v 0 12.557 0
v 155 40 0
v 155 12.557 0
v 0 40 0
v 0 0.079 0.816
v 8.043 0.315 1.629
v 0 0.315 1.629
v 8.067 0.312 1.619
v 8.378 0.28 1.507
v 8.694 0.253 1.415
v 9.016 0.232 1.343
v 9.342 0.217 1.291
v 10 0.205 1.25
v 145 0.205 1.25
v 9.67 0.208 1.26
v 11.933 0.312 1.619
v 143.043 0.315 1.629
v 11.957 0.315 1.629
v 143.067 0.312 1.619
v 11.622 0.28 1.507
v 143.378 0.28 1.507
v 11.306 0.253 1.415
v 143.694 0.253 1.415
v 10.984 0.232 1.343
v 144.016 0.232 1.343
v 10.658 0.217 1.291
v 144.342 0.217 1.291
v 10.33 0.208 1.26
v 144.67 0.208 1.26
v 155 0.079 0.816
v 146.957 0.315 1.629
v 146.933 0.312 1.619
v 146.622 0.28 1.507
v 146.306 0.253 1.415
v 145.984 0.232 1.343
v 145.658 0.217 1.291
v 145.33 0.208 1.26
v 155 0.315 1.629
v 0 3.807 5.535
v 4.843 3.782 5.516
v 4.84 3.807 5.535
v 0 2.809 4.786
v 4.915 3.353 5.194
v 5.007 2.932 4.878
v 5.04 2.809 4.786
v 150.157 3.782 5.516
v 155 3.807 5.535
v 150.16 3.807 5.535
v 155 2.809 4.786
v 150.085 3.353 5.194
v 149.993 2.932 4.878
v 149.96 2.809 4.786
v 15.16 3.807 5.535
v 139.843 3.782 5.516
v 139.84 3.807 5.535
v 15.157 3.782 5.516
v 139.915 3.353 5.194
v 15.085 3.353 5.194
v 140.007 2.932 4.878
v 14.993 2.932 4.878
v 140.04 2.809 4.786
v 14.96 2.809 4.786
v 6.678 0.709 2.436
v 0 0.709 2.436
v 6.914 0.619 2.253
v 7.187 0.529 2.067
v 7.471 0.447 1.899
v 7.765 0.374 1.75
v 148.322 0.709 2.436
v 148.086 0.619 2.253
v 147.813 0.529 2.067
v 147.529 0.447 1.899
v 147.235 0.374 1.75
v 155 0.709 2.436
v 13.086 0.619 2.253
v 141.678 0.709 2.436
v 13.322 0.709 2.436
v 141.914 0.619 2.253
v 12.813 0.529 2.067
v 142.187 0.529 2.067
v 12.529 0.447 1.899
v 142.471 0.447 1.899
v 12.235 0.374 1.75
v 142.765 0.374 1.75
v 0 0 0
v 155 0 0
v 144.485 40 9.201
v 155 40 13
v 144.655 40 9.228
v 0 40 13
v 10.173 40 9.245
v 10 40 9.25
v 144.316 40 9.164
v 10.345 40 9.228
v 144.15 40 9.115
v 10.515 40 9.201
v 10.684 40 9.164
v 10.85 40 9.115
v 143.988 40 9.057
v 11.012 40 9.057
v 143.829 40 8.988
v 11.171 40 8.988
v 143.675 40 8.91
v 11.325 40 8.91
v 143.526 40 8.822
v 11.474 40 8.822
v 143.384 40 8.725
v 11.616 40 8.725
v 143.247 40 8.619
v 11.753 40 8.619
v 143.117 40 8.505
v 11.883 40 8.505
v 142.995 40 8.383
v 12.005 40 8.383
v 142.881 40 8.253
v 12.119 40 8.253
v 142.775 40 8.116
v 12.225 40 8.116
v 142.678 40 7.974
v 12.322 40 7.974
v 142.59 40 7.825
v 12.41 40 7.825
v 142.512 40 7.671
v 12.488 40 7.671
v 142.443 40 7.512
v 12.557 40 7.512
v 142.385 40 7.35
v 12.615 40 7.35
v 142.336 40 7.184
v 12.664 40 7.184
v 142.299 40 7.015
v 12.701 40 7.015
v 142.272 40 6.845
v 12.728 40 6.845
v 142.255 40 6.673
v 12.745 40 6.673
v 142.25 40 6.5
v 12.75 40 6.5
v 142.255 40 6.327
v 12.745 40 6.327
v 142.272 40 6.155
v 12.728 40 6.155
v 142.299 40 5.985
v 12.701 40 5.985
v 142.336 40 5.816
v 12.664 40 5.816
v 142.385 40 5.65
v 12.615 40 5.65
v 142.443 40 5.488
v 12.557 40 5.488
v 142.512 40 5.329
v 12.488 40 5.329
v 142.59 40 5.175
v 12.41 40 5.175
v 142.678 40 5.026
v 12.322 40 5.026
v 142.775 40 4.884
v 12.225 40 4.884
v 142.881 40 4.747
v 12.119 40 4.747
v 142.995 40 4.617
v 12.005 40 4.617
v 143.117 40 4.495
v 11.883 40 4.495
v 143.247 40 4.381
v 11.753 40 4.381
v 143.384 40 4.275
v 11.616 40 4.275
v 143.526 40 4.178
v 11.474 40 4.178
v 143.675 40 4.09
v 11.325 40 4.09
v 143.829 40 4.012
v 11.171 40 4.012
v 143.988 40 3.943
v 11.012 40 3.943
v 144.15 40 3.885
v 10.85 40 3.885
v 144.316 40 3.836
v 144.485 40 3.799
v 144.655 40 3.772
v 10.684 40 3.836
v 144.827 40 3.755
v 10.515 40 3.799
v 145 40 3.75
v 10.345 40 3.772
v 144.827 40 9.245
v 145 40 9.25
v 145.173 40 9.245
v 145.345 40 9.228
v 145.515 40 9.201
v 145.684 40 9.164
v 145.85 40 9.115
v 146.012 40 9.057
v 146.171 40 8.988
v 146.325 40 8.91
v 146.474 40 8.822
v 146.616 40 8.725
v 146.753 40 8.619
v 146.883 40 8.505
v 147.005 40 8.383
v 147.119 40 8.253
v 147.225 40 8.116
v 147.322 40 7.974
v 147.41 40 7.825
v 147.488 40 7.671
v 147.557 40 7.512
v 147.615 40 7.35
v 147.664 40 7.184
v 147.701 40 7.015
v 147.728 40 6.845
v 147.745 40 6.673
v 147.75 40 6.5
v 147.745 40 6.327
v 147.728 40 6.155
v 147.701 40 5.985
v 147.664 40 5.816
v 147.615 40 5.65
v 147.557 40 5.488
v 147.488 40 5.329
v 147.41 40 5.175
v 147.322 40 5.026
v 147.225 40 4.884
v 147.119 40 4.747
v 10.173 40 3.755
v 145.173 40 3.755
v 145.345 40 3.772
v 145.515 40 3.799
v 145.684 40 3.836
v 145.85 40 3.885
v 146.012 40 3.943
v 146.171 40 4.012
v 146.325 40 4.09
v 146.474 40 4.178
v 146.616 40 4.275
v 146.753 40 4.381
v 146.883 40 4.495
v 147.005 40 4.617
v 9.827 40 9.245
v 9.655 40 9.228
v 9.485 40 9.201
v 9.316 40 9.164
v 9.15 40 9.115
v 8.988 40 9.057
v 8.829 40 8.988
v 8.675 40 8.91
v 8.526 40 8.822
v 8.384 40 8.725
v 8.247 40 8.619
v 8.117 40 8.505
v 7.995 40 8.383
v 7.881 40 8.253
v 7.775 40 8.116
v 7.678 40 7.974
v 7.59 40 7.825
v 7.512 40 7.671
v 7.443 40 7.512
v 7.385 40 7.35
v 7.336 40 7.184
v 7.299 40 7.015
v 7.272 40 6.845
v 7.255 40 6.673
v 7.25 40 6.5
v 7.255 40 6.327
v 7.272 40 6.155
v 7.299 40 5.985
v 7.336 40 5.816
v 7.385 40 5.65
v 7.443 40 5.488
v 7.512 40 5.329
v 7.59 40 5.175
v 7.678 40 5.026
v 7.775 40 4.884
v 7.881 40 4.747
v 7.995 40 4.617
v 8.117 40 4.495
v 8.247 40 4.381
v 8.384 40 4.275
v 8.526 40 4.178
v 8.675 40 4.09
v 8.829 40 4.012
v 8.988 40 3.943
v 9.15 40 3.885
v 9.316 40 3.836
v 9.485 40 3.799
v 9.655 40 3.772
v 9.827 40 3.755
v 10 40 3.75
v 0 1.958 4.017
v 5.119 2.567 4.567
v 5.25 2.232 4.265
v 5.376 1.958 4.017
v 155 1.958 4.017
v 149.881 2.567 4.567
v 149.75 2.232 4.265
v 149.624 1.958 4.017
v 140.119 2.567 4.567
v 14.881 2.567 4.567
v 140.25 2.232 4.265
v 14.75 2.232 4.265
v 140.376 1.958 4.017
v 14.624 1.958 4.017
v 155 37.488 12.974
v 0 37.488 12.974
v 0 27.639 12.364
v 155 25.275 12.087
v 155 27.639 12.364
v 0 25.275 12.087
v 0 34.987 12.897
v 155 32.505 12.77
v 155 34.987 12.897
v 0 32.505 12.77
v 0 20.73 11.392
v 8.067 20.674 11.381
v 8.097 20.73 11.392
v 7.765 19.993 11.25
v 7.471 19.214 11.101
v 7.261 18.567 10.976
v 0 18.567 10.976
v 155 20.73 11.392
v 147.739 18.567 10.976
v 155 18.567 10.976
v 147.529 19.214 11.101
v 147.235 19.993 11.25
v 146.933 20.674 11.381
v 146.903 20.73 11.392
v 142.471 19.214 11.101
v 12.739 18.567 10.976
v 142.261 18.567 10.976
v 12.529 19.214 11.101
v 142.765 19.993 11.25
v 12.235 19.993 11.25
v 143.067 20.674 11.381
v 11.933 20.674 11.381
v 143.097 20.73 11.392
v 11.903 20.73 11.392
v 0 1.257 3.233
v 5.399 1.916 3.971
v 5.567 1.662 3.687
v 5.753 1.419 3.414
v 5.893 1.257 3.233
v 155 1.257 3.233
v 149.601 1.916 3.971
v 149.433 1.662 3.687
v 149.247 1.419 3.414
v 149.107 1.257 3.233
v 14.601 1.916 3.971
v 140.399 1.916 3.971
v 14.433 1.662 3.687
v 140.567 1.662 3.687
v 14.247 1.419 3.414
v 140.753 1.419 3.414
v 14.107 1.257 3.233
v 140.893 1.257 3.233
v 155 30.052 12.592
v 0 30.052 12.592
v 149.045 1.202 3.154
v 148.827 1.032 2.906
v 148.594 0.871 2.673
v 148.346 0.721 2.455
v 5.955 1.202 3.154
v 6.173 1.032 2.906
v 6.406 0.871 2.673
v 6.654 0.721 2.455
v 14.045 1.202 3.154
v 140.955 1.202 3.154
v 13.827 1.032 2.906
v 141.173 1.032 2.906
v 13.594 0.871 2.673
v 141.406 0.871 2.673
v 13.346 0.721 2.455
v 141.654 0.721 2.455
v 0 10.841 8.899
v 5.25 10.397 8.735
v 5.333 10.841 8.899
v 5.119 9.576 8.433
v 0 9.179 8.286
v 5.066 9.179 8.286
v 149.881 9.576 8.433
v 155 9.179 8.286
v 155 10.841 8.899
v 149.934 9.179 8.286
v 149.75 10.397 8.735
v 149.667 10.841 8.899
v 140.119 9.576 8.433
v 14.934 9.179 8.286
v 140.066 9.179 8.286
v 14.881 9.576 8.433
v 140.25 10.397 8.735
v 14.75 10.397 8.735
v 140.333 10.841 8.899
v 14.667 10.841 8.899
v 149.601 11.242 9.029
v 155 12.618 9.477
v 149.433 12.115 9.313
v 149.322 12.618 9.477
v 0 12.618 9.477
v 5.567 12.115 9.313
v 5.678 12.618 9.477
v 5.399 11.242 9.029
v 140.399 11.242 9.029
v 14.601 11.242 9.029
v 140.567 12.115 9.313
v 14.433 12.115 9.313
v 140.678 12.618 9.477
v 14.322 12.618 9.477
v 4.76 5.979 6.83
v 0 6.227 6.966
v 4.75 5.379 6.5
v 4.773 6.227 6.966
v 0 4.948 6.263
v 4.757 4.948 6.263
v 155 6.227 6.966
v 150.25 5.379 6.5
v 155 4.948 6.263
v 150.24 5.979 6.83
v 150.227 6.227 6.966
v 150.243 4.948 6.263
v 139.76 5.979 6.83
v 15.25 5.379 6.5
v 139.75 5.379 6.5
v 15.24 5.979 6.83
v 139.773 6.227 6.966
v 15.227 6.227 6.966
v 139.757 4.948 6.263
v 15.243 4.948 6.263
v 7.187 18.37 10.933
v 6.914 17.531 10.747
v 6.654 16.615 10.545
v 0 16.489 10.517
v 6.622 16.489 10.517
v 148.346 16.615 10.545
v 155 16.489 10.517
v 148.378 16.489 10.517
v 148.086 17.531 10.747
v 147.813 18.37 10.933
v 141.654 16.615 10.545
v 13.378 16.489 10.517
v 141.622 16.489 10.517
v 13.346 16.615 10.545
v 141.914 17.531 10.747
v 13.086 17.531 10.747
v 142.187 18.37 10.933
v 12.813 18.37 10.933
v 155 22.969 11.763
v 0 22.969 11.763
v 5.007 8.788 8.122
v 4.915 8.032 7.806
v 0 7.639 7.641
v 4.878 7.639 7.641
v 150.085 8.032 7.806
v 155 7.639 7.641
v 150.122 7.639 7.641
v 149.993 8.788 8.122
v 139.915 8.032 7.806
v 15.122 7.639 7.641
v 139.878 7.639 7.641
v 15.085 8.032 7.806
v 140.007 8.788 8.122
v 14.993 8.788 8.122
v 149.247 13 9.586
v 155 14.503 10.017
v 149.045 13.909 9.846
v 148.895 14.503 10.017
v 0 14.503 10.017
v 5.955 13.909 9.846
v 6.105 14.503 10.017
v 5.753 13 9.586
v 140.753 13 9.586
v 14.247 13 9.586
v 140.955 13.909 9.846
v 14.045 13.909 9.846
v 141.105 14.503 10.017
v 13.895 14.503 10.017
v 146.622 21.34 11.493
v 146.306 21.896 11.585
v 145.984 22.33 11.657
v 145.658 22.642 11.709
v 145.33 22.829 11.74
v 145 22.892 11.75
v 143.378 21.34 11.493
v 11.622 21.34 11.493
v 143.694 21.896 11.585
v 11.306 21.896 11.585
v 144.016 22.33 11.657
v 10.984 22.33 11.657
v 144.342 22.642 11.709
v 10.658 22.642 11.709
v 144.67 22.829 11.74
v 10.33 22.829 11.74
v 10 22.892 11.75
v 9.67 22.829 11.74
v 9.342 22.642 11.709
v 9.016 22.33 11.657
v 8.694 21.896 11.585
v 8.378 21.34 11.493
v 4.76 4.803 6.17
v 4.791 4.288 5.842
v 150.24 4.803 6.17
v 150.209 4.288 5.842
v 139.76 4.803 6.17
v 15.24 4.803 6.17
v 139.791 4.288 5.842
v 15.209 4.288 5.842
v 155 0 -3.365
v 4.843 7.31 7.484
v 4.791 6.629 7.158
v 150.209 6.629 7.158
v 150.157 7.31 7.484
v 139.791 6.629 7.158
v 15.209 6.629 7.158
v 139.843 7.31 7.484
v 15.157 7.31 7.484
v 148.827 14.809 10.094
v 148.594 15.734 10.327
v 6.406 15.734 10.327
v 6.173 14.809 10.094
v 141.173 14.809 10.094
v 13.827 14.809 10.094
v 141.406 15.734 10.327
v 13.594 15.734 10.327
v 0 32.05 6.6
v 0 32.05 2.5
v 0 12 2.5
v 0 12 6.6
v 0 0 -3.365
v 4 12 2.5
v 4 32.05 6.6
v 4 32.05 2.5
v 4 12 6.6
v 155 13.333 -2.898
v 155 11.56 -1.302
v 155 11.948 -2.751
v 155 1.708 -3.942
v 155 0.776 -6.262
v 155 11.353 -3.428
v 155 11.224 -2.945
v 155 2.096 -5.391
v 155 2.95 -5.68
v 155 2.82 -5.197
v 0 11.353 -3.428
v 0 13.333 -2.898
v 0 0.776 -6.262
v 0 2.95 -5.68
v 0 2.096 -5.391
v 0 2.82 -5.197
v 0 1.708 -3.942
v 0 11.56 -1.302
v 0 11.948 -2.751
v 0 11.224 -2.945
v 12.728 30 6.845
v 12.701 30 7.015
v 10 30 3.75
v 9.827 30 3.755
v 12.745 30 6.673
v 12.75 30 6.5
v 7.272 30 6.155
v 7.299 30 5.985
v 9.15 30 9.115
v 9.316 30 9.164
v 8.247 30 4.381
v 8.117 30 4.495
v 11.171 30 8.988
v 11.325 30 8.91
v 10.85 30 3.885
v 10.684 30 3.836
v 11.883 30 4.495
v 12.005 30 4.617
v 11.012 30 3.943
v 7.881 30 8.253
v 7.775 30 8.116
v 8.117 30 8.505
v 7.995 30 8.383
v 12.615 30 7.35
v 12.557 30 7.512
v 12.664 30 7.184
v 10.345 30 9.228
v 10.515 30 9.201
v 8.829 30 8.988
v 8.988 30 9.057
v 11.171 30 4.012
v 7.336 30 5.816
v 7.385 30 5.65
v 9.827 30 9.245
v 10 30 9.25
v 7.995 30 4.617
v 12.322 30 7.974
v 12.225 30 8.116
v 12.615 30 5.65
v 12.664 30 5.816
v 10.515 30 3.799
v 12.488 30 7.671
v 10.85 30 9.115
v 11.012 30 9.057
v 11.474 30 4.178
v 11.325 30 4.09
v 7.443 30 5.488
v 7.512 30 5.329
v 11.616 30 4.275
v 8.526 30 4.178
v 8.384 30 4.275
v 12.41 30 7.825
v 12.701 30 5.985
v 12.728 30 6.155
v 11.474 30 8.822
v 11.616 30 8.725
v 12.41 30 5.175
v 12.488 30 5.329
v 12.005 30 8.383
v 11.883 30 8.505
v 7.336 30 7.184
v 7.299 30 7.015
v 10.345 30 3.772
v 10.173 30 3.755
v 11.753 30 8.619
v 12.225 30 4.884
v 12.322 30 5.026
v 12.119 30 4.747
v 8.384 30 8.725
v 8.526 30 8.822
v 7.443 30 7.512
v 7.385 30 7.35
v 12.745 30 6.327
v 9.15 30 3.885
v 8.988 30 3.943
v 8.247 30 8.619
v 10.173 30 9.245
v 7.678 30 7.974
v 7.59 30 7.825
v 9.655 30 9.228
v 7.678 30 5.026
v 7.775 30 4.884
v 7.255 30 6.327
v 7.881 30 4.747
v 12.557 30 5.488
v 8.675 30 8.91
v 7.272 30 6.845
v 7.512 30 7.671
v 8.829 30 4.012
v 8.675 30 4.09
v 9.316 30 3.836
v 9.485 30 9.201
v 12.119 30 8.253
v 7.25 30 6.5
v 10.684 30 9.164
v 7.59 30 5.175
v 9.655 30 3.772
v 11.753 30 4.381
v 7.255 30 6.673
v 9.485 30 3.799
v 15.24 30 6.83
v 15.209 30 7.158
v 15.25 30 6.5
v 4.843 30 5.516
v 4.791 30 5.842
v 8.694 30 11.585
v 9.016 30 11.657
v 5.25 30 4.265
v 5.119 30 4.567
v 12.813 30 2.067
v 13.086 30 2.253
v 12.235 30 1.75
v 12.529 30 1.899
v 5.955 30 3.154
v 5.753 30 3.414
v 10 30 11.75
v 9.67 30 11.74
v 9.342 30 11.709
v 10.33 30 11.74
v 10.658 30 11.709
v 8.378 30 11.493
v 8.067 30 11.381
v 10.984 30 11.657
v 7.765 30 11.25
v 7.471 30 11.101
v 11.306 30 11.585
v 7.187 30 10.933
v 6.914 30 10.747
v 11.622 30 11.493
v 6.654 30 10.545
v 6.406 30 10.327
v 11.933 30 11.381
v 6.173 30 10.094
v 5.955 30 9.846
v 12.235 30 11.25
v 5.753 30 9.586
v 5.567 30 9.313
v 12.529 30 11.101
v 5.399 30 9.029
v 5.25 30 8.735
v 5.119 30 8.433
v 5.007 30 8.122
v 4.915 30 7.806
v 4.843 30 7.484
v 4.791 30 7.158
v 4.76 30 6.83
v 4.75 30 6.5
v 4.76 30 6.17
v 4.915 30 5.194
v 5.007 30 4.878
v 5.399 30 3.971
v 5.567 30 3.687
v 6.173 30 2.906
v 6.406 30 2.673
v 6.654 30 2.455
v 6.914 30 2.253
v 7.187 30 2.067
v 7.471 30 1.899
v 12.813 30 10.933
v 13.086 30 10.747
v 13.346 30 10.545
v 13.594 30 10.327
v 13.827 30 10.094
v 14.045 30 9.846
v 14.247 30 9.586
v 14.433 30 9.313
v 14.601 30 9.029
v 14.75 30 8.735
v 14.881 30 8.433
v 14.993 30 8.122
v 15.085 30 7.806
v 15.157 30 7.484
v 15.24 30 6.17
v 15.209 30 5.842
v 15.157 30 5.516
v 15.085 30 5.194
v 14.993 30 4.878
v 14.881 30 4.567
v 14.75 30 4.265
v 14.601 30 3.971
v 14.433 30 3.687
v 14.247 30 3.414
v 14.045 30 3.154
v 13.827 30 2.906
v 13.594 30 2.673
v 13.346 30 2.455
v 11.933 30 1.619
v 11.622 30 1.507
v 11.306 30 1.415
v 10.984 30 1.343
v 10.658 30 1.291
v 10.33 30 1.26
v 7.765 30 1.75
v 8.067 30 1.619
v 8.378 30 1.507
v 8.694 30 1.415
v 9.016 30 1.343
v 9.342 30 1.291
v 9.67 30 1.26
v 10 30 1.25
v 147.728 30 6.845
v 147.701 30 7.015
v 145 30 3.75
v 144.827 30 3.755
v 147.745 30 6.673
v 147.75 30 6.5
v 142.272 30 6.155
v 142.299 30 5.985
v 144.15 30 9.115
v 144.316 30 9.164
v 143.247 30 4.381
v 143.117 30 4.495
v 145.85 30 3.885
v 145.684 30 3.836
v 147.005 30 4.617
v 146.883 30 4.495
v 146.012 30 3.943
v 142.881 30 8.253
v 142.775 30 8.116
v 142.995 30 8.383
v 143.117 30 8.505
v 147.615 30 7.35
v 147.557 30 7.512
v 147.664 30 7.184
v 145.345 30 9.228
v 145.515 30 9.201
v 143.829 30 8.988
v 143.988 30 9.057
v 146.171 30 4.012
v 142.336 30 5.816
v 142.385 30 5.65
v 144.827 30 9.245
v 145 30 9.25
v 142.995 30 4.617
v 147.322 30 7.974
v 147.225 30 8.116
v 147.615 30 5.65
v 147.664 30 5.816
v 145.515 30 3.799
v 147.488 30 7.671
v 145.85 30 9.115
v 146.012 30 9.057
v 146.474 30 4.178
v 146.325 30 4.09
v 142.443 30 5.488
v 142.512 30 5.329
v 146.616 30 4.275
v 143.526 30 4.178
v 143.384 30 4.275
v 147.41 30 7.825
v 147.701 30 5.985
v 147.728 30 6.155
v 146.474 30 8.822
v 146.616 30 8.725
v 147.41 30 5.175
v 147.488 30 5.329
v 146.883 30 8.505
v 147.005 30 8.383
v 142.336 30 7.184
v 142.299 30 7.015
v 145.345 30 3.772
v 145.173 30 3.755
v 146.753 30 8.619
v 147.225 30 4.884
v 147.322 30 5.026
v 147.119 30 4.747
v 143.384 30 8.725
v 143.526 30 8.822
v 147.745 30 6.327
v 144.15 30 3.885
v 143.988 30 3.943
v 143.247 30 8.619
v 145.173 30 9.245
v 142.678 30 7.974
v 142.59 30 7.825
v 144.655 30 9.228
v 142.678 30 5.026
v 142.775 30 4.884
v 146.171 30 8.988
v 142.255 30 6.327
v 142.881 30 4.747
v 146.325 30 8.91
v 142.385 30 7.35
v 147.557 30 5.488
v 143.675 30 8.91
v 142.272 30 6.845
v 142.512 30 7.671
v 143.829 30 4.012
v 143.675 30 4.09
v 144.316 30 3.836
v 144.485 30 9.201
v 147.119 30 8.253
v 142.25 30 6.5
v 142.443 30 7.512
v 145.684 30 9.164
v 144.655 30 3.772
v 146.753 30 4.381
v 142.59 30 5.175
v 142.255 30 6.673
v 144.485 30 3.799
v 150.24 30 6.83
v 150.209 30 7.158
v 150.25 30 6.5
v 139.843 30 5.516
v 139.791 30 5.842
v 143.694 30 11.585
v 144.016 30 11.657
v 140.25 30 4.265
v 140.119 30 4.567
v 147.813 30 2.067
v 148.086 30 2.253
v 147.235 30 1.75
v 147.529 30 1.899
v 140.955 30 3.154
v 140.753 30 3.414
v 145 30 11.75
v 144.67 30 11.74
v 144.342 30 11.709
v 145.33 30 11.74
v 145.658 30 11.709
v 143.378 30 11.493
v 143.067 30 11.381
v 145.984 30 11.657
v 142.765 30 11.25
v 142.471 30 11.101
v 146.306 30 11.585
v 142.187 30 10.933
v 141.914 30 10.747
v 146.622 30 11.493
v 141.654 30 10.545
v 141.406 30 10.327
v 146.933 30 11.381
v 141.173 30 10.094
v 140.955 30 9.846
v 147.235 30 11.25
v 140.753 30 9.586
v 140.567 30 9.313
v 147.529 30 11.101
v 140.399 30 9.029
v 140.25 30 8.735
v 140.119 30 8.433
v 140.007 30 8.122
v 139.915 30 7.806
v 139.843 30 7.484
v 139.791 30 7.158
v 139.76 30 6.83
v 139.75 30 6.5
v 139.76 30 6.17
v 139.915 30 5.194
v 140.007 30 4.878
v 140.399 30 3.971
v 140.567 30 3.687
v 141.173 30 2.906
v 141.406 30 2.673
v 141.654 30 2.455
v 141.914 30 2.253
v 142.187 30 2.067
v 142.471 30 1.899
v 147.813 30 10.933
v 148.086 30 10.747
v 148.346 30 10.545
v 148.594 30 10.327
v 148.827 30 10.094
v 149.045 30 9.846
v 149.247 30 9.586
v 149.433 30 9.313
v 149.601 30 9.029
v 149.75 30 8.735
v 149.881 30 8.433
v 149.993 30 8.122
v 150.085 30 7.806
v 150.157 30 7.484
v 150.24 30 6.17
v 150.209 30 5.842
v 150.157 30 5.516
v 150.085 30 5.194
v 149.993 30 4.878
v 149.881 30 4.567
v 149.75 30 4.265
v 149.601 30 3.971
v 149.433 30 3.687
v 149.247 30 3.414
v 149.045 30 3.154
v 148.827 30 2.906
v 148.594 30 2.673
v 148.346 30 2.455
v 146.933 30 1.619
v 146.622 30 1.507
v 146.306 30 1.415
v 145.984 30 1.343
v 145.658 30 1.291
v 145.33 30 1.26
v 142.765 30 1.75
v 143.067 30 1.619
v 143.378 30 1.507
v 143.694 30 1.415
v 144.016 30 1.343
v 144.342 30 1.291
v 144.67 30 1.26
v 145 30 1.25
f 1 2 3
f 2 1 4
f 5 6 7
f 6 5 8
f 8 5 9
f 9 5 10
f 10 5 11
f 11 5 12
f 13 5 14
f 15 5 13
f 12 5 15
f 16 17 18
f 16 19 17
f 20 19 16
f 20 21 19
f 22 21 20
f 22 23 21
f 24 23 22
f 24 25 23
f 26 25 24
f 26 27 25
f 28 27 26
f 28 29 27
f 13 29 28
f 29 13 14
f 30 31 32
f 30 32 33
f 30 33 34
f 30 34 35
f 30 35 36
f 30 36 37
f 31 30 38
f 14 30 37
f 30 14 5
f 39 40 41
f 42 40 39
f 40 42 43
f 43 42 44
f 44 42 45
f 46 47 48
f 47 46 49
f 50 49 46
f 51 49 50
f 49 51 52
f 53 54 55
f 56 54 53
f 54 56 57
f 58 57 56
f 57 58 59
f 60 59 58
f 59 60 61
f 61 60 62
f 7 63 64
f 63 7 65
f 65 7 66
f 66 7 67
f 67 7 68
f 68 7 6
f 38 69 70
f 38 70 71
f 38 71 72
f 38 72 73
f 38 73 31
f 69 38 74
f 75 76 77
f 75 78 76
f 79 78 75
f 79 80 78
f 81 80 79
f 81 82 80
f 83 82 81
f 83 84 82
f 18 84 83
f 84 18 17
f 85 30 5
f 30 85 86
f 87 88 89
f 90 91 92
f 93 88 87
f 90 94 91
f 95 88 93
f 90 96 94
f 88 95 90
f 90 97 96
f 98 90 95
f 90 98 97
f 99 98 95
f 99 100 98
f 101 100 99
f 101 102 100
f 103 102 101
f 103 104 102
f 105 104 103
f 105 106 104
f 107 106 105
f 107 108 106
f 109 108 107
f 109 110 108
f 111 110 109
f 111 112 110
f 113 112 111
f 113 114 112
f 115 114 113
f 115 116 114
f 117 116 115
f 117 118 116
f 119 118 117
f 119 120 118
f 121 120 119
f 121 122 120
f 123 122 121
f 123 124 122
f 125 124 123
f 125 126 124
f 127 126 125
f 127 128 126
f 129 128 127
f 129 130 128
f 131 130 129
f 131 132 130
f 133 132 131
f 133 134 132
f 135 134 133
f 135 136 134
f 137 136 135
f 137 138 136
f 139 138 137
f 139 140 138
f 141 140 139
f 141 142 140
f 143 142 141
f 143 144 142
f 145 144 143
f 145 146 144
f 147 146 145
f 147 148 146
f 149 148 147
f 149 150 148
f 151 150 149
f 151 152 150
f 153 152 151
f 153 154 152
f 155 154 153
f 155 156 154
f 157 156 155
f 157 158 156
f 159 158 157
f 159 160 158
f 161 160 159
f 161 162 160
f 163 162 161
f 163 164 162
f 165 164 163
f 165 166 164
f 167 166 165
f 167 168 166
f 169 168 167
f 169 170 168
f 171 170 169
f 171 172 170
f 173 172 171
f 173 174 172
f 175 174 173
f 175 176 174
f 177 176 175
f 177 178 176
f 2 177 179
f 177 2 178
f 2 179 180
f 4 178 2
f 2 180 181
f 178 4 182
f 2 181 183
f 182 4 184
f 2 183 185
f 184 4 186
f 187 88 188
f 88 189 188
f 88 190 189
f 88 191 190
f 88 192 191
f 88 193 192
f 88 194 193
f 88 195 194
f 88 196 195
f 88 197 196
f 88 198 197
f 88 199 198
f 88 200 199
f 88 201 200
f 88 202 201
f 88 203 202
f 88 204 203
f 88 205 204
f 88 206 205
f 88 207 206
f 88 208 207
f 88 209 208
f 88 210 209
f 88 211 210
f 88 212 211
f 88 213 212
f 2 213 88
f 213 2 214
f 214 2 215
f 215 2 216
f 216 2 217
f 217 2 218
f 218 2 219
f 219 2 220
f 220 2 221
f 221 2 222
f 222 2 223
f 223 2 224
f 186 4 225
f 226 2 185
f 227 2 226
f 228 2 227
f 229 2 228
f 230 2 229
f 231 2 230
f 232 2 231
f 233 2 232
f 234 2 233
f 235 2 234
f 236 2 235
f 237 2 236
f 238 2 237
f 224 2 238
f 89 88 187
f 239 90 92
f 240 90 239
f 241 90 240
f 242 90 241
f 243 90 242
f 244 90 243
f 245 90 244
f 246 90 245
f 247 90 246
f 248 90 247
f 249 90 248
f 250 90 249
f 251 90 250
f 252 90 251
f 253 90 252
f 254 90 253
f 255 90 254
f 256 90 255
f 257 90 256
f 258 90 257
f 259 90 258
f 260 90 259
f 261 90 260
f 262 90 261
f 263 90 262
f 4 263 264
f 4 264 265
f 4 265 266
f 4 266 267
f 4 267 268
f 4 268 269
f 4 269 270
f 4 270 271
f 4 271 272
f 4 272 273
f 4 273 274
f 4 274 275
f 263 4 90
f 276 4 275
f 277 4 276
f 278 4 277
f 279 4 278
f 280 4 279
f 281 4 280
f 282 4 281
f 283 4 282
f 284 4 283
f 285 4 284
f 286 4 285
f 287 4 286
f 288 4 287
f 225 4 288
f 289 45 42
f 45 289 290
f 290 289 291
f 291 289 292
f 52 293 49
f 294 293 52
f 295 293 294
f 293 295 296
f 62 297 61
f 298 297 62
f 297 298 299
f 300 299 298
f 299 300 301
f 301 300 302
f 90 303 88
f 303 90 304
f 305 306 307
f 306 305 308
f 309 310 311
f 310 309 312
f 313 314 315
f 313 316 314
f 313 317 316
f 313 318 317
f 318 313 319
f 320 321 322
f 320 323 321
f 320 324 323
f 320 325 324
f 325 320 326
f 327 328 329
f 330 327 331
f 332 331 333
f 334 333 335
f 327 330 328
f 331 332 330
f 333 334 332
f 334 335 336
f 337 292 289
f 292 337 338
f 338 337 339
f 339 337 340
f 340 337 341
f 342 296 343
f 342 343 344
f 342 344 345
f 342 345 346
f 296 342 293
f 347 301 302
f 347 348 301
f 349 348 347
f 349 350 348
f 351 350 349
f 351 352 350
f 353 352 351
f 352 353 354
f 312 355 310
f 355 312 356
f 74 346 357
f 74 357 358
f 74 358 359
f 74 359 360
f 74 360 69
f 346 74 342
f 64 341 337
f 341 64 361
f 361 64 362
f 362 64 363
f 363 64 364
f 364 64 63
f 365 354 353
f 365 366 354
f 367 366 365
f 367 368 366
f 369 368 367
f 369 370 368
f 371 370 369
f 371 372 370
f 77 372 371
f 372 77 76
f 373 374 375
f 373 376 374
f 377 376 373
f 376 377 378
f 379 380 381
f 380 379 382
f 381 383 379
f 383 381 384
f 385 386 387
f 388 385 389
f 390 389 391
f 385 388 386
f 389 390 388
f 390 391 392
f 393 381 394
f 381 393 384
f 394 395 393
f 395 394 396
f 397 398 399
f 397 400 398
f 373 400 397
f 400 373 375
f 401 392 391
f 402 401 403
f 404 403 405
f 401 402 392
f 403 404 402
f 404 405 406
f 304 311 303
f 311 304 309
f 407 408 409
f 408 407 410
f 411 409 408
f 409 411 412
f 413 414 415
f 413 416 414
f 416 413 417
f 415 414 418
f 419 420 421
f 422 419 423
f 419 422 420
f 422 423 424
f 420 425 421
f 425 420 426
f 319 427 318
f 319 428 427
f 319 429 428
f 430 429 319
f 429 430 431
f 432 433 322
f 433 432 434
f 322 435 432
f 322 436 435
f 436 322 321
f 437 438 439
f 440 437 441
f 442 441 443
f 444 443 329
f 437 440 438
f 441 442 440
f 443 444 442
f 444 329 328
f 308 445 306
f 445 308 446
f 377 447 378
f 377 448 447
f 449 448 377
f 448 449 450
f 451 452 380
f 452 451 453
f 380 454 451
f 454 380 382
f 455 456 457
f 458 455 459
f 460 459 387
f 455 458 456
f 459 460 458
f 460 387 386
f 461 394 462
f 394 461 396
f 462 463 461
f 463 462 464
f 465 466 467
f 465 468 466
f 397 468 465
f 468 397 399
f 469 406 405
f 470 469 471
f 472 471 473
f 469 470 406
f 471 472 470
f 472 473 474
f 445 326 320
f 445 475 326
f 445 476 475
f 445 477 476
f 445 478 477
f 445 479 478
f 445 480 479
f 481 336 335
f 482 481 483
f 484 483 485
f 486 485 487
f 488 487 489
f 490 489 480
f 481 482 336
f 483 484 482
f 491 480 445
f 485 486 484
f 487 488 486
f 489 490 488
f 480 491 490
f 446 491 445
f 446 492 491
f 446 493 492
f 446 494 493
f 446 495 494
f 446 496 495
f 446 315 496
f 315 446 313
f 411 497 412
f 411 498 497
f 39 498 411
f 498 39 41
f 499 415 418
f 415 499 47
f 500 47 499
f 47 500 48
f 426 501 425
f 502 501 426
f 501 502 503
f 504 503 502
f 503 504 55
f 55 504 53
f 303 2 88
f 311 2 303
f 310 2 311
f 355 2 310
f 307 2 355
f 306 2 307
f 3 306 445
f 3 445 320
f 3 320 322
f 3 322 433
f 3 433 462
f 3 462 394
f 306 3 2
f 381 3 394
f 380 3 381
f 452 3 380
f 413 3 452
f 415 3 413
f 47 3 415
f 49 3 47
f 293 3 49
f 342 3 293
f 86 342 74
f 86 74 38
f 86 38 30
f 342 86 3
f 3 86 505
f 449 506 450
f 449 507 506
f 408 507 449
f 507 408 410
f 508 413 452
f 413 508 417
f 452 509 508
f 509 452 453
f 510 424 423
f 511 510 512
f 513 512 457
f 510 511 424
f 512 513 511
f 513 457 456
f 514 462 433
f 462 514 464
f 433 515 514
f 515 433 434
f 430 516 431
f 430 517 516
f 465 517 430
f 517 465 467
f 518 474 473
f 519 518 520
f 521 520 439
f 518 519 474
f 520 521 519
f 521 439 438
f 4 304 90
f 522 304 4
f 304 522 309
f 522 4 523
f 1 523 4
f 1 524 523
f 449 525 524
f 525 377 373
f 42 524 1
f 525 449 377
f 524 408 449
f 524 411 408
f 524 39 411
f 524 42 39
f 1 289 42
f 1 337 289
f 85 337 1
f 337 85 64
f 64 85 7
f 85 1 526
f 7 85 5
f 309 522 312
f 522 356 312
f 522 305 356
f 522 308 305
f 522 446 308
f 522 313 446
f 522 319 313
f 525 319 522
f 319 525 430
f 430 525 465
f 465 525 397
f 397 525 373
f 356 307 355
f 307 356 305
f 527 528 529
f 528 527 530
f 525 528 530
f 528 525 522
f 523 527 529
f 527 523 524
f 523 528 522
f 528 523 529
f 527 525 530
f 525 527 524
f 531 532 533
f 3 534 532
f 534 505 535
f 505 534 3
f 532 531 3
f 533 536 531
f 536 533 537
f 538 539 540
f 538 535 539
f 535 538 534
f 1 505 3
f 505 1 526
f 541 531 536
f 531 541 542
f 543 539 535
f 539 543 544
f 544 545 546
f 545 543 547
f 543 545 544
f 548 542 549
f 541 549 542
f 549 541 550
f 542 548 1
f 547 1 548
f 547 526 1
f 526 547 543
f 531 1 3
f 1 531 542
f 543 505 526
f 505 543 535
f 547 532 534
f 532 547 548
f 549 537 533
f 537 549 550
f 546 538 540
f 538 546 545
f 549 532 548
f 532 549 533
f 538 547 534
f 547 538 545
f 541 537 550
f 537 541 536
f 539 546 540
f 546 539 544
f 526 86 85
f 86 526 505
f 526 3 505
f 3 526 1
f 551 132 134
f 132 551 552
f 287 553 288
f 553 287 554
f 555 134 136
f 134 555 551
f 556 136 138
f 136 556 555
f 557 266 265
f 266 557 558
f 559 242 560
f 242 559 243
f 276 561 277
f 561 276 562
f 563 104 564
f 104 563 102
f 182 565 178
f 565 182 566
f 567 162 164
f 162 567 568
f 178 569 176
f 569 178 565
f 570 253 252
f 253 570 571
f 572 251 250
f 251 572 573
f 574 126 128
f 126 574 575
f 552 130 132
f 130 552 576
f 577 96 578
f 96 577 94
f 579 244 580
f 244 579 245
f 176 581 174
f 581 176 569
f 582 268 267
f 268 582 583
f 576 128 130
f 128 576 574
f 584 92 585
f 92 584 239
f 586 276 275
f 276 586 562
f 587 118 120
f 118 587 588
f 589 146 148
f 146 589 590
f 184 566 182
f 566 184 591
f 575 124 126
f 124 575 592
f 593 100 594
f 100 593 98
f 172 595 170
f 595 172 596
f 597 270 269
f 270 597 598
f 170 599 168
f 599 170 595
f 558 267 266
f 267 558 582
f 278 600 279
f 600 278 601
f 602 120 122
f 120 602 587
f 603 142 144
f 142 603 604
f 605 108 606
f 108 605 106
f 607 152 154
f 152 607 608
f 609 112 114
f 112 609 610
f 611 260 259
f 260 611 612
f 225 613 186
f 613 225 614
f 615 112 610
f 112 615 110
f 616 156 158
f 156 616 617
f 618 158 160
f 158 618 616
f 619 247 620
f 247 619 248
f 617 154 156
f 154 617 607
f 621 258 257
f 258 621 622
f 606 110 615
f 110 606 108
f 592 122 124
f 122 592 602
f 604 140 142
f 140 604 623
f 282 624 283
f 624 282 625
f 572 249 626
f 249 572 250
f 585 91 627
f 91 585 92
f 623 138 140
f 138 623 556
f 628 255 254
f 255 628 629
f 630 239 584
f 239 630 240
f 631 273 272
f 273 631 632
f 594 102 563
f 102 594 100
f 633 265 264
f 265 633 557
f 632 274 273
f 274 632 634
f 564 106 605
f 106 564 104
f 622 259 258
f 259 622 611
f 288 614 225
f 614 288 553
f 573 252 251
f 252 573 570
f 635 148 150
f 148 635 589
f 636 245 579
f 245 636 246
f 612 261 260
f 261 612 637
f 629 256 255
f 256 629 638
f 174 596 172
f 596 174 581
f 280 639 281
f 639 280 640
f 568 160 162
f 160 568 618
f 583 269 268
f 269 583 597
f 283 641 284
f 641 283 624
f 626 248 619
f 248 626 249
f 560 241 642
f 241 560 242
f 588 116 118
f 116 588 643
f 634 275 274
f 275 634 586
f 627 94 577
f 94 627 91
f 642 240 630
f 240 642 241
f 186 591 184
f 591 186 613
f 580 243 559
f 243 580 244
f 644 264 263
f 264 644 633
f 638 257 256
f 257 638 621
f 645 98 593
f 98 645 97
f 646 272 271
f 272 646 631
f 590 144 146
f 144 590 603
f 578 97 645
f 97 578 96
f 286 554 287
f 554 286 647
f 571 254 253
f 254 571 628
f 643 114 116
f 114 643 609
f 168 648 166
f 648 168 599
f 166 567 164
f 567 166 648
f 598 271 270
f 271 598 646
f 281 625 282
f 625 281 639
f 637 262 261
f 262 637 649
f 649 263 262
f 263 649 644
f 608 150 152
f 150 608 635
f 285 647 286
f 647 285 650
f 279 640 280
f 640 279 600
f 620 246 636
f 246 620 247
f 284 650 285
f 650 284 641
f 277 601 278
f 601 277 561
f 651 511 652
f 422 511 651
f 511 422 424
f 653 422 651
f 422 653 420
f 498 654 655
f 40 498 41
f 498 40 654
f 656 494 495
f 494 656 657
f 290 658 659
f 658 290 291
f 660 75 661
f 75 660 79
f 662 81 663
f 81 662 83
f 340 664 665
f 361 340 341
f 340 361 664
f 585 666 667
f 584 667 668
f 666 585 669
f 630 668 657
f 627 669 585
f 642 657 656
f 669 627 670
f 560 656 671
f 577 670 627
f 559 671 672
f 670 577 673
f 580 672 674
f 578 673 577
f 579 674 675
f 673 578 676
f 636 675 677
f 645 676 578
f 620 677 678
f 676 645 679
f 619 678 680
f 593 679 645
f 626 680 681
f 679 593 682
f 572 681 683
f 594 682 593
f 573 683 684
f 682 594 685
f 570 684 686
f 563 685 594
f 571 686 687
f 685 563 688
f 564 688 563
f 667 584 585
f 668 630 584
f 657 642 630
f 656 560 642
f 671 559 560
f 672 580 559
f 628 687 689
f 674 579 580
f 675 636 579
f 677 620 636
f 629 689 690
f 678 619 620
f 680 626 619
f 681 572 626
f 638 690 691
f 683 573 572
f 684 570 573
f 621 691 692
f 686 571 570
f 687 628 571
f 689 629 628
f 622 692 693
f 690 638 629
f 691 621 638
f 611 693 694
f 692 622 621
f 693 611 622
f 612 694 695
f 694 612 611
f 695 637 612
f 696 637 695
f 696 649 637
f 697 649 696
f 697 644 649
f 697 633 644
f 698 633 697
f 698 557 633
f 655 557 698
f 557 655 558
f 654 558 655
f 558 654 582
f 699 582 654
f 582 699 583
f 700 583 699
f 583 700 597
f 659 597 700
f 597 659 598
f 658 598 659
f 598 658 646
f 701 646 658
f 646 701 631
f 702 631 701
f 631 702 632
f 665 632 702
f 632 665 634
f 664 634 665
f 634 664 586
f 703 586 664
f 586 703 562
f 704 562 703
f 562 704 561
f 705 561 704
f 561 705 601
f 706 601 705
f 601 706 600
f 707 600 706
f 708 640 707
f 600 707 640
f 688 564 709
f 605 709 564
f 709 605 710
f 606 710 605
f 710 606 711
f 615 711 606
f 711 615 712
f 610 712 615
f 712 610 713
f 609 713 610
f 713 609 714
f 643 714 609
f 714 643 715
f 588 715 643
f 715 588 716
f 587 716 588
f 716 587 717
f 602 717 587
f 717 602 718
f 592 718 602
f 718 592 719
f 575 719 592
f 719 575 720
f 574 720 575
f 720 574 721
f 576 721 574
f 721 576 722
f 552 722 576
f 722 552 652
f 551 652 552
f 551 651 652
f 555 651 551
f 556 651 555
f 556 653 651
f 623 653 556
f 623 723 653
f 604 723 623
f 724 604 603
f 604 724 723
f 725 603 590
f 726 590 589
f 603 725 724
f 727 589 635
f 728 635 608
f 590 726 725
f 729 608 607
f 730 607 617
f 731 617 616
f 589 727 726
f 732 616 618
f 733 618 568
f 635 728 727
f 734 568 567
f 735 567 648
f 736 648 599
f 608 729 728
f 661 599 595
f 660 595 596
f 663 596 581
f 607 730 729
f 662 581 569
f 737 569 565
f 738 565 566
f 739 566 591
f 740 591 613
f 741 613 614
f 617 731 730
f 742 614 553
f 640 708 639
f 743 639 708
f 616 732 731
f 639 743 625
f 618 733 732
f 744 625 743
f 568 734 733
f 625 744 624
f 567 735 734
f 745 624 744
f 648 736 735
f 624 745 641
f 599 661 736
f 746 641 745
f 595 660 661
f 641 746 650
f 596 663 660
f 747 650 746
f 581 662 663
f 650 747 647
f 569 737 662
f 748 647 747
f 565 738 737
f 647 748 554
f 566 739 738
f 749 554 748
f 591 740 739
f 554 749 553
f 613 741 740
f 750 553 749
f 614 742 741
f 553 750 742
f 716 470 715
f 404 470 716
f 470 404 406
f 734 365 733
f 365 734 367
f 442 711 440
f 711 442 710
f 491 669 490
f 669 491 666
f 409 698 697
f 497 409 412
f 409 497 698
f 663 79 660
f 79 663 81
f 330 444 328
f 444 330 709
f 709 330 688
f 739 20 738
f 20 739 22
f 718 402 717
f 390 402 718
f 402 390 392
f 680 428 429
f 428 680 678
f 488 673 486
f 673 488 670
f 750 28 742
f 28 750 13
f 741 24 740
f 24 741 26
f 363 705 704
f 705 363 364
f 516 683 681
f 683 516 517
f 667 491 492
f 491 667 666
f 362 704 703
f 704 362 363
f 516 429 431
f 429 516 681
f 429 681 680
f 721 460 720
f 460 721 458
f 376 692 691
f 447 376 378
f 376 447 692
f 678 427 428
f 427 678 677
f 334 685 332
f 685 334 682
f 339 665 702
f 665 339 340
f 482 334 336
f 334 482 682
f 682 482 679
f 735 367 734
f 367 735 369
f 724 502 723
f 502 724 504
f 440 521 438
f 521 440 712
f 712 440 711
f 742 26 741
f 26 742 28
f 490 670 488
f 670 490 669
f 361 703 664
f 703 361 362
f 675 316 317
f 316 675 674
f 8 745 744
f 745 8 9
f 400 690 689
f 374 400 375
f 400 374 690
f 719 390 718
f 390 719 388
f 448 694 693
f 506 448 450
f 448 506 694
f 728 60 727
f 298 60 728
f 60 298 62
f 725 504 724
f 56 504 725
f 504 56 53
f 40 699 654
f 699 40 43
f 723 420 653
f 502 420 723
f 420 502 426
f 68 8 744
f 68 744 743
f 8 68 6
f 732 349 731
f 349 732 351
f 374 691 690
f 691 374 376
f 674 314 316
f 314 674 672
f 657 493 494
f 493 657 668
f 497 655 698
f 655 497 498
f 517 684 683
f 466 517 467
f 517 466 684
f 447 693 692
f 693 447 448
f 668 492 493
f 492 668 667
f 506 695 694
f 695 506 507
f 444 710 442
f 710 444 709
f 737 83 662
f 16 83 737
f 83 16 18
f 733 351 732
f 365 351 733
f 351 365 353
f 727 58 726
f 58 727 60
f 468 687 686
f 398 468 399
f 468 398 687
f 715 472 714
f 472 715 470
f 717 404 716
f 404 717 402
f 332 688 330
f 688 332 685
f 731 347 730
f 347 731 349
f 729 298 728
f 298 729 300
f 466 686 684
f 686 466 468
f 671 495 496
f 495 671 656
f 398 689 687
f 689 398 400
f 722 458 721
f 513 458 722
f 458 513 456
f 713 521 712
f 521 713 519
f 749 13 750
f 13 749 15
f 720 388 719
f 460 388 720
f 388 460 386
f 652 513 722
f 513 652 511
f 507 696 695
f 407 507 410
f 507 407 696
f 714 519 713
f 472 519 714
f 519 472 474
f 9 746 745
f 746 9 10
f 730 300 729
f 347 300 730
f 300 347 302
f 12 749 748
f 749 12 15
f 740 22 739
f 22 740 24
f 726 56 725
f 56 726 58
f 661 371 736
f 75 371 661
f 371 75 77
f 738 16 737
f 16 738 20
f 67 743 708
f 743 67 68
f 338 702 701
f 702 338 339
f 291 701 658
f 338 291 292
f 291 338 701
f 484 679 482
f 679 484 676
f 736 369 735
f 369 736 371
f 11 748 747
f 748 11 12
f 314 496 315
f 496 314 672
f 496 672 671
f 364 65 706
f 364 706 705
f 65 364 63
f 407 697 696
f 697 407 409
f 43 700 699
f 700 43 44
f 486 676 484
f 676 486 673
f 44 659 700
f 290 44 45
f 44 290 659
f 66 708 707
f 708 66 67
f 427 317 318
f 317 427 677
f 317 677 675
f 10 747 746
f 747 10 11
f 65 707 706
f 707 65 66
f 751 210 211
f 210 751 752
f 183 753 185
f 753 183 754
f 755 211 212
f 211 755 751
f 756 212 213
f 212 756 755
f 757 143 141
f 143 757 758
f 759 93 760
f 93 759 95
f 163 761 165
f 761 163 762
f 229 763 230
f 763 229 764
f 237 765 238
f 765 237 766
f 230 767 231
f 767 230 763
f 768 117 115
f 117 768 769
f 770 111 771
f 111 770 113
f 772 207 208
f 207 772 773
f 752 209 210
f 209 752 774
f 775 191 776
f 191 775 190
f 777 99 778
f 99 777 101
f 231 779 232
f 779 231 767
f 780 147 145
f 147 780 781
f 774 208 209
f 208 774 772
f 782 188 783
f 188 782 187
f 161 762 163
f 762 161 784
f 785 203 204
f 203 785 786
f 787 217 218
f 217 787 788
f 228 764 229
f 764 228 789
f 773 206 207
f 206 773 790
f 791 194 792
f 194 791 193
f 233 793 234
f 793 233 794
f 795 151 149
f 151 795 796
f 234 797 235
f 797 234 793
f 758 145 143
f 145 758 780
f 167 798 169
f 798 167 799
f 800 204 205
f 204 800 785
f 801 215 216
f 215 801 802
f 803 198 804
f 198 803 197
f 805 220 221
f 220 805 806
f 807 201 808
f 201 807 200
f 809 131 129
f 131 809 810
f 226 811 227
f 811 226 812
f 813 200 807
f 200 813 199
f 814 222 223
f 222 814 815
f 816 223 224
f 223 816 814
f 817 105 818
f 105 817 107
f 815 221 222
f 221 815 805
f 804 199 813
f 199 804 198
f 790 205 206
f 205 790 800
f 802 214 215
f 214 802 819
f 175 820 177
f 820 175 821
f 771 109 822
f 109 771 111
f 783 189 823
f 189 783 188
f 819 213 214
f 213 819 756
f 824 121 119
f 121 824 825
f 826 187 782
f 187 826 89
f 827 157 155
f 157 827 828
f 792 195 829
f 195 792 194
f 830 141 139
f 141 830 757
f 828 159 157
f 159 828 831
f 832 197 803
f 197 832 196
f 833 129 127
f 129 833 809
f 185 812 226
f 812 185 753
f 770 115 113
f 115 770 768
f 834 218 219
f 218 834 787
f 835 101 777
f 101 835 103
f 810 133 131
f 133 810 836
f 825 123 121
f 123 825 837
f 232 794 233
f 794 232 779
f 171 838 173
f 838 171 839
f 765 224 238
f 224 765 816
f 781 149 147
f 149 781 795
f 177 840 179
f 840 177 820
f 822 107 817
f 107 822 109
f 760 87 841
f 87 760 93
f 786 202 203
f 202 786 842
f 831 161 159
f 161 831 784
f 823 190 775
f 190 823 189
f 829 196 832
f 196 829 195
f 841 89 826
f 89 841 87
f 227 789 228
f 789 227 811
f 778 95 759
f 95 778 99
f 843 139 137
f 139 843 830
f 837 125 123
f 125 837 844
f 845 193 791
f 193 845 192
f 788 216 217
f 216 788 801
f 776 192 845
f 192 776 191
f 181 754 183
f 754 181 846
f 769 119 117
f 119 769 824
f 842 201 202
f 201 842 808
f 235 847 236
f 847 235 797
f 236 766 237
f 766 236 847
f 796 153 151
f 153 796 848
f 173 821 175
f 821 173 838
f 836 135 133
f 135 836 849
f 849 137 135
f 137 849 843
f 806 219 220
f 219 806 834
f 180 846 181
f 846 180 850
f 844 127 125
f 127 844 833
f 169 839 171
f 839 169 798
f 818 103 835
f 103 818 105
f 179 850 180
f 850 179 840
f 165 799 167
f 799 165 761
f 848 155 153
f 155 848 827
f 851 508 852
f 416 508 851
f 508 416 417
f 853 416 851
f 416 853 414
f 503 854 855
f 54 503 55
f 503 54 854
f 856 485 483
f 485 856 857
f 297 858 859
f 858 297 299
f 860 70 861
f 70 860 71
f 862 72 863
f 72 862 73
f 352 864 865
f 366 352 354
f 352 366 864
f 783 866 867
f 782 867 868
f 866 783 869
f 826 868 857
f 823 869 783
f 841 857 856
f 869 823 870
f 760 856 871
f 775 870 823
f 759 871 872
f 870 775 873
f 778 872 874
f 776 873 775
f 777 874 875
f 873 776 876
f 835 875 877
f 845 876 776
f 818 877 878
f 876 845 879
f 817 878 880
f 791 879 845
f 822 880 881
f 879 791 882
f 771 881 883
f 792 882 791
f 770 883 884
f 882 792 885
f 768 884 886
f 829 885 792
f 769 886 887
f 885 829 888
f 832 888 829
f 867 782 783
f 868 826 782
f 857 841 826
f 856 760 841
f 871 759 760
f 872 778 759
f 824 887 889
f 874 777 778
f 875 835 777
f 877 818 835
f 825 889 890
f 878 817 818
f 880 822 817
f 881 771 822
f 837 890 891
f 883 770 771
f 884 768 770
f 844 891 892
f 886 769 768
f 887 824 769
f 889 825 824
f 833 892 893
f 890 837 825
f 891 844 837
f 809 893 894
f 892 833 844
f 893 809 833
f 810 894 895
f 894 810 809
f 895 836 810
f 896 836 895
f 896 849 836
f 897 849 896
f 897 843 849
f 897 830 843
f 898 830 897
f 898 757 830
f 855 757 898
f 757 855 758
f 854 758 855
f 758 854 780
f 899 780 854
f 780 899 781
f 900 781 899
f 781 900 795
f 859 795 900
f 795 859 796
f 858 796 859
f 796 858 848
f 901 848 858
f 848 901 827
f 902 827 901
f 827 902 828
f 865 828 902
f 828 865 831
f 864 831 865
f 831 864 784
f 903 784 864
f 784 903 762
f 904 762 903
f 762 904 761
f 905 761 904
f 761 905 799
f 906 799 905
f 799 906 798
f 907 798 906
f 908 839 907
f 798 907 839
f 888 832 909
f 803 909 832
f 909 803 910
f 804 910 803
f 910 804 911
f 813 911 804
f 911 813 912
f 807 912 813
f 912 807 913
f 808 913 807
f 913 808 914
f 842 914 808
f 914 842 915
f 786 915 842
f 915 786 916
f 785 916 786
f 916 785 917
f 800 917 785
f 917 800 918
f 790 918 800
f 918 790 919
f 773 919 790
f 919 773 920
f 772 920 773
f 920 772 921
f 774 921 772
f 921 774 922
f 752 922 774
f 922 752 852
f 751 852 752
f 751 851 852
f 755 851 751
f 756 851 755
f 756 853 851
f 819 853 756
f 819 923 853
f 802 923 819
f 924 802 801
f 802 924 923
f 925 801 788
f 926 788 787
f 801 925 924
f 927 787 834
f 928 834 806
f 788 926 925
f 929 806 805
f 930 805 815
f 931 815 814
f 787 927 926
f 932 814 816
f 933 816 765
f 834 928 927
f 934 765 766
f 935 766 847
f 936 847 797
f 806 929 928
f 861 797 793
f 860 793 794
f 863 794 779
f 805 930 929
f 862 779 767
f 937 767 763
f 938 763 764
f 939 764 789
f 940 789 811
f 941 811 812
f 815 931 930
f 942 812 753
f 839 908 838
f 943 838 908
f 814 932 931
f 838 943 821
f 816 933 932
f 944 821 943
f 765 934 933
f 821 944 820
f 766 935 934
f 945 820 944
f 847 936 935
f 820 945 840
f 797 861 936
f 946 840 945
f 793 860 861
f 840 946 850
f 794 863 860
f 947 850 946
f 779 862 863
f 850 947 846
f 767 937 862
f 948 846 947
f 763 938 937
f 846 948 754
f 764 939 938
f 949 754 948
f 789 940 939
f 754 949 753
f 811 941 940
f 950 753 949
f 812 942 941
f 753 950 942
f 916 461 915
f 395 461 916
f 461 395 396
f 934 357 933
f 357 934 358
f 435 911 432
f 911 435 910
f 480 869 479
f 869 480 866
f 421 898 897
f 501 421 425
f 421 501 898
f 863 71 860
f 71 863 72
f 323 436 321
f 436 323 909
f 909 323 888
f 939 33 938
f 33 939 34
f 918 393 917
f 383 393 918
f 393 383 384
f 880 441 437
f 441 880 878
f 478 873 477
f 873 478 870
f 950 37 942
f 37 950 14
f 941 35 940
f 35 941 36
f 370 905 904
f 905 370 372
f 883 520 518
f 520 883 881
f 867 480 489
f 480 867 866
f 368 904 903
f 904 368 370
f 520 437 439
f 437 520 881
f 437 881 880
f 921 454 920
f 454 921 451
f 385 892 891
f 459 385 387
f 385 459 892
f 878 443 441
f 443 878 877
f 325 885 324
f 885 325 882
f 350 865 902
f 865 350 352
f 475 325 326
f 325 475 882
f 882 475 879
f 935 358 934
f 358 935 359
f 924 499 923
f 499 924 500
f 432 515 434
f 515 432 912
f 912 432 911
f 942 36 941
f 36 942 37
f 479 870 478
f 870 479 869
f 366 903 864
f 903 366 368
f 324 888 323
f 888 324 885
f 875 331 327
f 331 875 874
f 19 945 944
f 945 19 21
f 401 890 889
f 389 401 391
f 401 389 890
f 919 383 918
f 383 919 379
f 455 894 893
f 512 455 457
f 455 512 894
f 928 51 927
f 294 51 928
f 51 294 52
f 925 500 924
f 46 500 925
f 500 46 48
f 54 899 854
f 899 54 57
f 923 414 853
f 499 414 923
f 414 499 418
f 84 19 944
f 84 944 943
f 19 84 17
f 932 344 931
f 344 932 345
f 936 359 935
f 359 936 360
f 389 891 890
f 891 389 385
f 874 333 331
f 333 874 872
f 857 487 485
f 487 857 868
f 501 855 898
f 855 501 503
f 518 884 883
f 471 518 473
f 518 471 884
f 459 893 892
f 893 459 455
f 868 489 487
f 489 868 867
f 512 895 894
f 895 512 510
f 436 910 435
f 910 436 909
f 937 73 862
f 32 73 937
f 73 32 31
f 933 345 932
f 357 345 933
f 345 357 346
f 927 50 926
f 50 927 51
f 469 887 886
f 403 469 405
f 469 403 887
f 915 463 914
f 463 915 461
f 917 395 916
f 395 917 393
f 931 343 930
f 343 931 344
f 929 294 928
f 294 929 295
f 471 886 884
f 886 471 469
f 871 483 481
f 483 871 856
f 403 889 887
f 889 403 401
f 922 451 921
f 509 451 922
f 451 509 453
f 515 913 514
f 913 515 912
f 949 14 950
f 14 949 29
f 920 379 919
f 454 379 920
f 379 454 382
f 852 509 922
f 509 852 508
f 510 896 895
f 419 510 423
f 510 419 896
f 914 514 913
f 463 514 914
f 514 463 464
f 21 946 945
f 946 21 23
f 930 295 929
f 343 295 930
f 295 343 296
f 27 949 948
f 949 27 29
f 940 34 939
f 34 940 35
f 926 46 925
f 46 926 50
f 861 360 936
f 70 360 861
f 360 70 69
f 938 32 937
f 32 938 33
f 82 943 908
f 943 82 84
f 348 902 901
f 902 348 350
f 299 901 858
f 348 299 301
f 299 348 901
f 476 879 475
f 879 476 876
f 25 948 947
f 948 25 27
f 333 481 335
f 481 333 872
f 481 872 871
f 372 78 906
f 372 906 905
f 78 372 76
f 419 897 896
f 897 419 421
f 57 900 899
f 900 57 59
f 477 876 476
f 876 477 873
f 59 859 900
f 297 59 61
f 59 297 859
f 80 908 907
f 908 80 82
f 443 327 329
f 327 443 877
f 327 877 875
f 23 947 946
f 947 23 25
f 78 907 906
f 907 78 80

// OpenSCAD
// bracket that supports LED light strip

// true if you are making two part brackets, false otherwise
twopart = true;

// length of a single part bracket, or half of a two part bracket
length = 155;

// material where fasteners attach to the car
bracketheight = 13;

// length of base from car to LED support
baselength = 40;
// thickness of base attached to 
basethickness = 10;

// triangle that supports LED light strip
// hypotenuse of triangle
lightfacewidth = 13;   
  
// angle of LED support relative to base of bracket
lightangle = 15;

// channel for LED light strip
channelheight = 3;

// diameter of the cap head of your M5 fastener of choice (measure and add 1.5 - 2mm)
capheaddiameter = 10.5;

// rotate the design for 3D printing
setupforprinting = false;

// plug or socket for connecting pieces
plug = false;

// template for drilling holes for rivnuts
template = false;

// hole placement in mm from edge
holeplacement = 10;

// two fastener holes instead of 4 on two part brackets- currently unimplemented
twoholes = false;

// "hollow" bracket for less material - currently unimplemented
usehollowbracket = false;

module squarebracket(st, sh, bt, bh) {
    cube([length, bt, bh]);
    translate([0, bt - st, bh]) {
        cube([length, st, sh]);
    }
}

module curvedbracket() {
    translate([0, baselength, 0]){ 
        rotate([-90, 0, -90]){
            linear_extrude(height = length)
            difference() {
                resize([baselength * 2, bracketheight * 2])circle($fn=100); 
                translate([-baselength, 0, 0]) { 
                    square(baselength * 2);
                }
                translate([-40, -bracketheight, 0]) {
                    square(40);
                }
            }
        }
    }
}

module lightbase(l) {
    lightheight = (sin(lightangle) * lightfacewidth);
    lightwidth =  (cos(lightangle) * lightfacewidth);
    translate([0, lightwidth, 0]) {
        rotate([180, 0, 0]) {
        polyhedron(//pt 0        1        2        3        4        5
                    points=[[0,0,0], [l,0,0], [l,lightwidth,0], [0,lightwidth,0], [0,lightwidth,lightheight], [l,lightwidth,lightheight]],
                    faces=[[0,1,2,3],[5,4,3,2],[0,4,5,1],[0,3,4],[5,2,1]]
                    );
        }
    }
    ledtrack(lightheight);
}

module ledtrack(h) {
    // lots of math to put the track where it goes...
    yoffset = sin(lightangle) * channelheight;
    zoffset = cos(lightangle) * channelheight;

    translate([0, yoffset, -h - zoffset]) {
        rotate([lightangle, 0, 0]) {
            difference() {
                cube([length, lightfacewidth, channelheight]);
                translate([0, 1.5, 0.5]) {
                    cube([length, 10.2, 1.5]);
                }
                translate([0, 2.25, 0]) {
                    cube([length, 8.7, 1.5]);
                }


                translate([length, 0, 0]) {
                    cube([0, 13, 1.5]);
                }

            }
        }
    }
}

module mountingholes(inset) {
    holelength = length;
    // if (plug == true) {
    //     holelength = length;
    // }
    rotate([90, 0, 0]) {
        translate([inset, bracketheight / 2, -baselength]) {
            cylinder(h=baselength, r = 5.5 / 2, $fn=100); 
        }
        translate([inset, bracketheight / 2, -baselength + 10]) {
            cylinder(h=baselength, r = capheaddiameter / 2, $fn=100); 
        }
        translate([holelength - inset, bracketheight / 2, -baselength]) {
            cylinder(h=baselength, r = 5.5 / 2, $fn=100); 
        }
        translate([holelength - inset, bracketheight / 2, -baselength + 10]) {
            cylinder(h=baselength, r = capheaddiameter / 2, $fn=100); 
        }
    }
}

module plug() {
    test = plug ? 0 : length;
    baselengthcenter = baselength / 2;
    baselengthheight = basethickness / 2;

    translate([length, baselengthcenter / 2 + 2, baselengthheight / 2]) {
        cube([4, baselength/2, 4]);
    }
}

module socket() {
    baselengthcenter = baselength / 2;
    baselengthheight = basethickness / 2;

    translate([0, baselengthcenter / 2 + 2, baselengthheight / 2]) {
        cube([4, (baselength + 0.1)/2, 4.1]);
    }
}

module hollowbracket(inset) {
    // use this again to calculate where the hollow part goes
    lightwidth =  (cos(lightangle) * lightfacewidth);
    translate([inset, lightwidth + 3, 0]) {
        cube([length - 2 * inset, baselength - lightwidth + 3, bracketheight - 3]);
    }
    // get some angles in there to avoid supports
}

module completeBracket() {
    if (plug) {
        curvedbracket();
        plug();
        lightbase(length);
    } else {
        difference() {
            curvedbracket();
            socket();
        }
       lightbase(length);

    }
}

module singlePieceBracket() {
    curvedbracket();
    lightbase(length);
}

module drillingholes(inset) {
    holelength = length;
    if (plug == true) {
        holelength = length;
    }
    rotate([90, 0, 0]) {
        translate([inset, bracketheight / 2, -baselength]) {
            cylinder(h=baselength, r = 5.5 / 2, $fn=100); 
        }
        translate([inset, bracketheight / 2, -baselength + 10]) {
            cylinder(h=baselength, r = 10.0 / 2, $fn=100); 
        }
        translate([holelength - inset, bracketheight / 2, -baselength]) {
            cylinder(h=baselength, r = 5.5 / 2, $fn=100); 
        }
        translate([holelength - inset, bracketheight / 2, -baselength + 10]) {
            cylinder(h=baselength, r = 10.0 / 2, $fn=100); 
        }
    }
}

module drillingtemplate() {
    rotate([90, 0, 0]) {
        difference() {
            cube([length, 3, bracketheight]);
            drillingholes(10);
        }
    }
}

module mountablebracket() {
    difference() {
        if (twopart == true) {
            completeBracket();
        } else { 
            singlePieceBracket();
        }
        mountingholes(holeplacement);
        // hollowbracket(20);
    }
    
}

if (template) {
    drillingtemplate();
} else {
    if (!setupforprinting) {
        mountablebracket();
    } else if (setupforprinting && plug) {
        rotate([0, 270, 0]) { 
        mountablebracket();
    }
    } else if (setupforprinting && !plug) {
        translate([0,0,length]) {
        rotate([0, 90, 0]) { 
            mountablebracket();
        }
    }
} 
}
